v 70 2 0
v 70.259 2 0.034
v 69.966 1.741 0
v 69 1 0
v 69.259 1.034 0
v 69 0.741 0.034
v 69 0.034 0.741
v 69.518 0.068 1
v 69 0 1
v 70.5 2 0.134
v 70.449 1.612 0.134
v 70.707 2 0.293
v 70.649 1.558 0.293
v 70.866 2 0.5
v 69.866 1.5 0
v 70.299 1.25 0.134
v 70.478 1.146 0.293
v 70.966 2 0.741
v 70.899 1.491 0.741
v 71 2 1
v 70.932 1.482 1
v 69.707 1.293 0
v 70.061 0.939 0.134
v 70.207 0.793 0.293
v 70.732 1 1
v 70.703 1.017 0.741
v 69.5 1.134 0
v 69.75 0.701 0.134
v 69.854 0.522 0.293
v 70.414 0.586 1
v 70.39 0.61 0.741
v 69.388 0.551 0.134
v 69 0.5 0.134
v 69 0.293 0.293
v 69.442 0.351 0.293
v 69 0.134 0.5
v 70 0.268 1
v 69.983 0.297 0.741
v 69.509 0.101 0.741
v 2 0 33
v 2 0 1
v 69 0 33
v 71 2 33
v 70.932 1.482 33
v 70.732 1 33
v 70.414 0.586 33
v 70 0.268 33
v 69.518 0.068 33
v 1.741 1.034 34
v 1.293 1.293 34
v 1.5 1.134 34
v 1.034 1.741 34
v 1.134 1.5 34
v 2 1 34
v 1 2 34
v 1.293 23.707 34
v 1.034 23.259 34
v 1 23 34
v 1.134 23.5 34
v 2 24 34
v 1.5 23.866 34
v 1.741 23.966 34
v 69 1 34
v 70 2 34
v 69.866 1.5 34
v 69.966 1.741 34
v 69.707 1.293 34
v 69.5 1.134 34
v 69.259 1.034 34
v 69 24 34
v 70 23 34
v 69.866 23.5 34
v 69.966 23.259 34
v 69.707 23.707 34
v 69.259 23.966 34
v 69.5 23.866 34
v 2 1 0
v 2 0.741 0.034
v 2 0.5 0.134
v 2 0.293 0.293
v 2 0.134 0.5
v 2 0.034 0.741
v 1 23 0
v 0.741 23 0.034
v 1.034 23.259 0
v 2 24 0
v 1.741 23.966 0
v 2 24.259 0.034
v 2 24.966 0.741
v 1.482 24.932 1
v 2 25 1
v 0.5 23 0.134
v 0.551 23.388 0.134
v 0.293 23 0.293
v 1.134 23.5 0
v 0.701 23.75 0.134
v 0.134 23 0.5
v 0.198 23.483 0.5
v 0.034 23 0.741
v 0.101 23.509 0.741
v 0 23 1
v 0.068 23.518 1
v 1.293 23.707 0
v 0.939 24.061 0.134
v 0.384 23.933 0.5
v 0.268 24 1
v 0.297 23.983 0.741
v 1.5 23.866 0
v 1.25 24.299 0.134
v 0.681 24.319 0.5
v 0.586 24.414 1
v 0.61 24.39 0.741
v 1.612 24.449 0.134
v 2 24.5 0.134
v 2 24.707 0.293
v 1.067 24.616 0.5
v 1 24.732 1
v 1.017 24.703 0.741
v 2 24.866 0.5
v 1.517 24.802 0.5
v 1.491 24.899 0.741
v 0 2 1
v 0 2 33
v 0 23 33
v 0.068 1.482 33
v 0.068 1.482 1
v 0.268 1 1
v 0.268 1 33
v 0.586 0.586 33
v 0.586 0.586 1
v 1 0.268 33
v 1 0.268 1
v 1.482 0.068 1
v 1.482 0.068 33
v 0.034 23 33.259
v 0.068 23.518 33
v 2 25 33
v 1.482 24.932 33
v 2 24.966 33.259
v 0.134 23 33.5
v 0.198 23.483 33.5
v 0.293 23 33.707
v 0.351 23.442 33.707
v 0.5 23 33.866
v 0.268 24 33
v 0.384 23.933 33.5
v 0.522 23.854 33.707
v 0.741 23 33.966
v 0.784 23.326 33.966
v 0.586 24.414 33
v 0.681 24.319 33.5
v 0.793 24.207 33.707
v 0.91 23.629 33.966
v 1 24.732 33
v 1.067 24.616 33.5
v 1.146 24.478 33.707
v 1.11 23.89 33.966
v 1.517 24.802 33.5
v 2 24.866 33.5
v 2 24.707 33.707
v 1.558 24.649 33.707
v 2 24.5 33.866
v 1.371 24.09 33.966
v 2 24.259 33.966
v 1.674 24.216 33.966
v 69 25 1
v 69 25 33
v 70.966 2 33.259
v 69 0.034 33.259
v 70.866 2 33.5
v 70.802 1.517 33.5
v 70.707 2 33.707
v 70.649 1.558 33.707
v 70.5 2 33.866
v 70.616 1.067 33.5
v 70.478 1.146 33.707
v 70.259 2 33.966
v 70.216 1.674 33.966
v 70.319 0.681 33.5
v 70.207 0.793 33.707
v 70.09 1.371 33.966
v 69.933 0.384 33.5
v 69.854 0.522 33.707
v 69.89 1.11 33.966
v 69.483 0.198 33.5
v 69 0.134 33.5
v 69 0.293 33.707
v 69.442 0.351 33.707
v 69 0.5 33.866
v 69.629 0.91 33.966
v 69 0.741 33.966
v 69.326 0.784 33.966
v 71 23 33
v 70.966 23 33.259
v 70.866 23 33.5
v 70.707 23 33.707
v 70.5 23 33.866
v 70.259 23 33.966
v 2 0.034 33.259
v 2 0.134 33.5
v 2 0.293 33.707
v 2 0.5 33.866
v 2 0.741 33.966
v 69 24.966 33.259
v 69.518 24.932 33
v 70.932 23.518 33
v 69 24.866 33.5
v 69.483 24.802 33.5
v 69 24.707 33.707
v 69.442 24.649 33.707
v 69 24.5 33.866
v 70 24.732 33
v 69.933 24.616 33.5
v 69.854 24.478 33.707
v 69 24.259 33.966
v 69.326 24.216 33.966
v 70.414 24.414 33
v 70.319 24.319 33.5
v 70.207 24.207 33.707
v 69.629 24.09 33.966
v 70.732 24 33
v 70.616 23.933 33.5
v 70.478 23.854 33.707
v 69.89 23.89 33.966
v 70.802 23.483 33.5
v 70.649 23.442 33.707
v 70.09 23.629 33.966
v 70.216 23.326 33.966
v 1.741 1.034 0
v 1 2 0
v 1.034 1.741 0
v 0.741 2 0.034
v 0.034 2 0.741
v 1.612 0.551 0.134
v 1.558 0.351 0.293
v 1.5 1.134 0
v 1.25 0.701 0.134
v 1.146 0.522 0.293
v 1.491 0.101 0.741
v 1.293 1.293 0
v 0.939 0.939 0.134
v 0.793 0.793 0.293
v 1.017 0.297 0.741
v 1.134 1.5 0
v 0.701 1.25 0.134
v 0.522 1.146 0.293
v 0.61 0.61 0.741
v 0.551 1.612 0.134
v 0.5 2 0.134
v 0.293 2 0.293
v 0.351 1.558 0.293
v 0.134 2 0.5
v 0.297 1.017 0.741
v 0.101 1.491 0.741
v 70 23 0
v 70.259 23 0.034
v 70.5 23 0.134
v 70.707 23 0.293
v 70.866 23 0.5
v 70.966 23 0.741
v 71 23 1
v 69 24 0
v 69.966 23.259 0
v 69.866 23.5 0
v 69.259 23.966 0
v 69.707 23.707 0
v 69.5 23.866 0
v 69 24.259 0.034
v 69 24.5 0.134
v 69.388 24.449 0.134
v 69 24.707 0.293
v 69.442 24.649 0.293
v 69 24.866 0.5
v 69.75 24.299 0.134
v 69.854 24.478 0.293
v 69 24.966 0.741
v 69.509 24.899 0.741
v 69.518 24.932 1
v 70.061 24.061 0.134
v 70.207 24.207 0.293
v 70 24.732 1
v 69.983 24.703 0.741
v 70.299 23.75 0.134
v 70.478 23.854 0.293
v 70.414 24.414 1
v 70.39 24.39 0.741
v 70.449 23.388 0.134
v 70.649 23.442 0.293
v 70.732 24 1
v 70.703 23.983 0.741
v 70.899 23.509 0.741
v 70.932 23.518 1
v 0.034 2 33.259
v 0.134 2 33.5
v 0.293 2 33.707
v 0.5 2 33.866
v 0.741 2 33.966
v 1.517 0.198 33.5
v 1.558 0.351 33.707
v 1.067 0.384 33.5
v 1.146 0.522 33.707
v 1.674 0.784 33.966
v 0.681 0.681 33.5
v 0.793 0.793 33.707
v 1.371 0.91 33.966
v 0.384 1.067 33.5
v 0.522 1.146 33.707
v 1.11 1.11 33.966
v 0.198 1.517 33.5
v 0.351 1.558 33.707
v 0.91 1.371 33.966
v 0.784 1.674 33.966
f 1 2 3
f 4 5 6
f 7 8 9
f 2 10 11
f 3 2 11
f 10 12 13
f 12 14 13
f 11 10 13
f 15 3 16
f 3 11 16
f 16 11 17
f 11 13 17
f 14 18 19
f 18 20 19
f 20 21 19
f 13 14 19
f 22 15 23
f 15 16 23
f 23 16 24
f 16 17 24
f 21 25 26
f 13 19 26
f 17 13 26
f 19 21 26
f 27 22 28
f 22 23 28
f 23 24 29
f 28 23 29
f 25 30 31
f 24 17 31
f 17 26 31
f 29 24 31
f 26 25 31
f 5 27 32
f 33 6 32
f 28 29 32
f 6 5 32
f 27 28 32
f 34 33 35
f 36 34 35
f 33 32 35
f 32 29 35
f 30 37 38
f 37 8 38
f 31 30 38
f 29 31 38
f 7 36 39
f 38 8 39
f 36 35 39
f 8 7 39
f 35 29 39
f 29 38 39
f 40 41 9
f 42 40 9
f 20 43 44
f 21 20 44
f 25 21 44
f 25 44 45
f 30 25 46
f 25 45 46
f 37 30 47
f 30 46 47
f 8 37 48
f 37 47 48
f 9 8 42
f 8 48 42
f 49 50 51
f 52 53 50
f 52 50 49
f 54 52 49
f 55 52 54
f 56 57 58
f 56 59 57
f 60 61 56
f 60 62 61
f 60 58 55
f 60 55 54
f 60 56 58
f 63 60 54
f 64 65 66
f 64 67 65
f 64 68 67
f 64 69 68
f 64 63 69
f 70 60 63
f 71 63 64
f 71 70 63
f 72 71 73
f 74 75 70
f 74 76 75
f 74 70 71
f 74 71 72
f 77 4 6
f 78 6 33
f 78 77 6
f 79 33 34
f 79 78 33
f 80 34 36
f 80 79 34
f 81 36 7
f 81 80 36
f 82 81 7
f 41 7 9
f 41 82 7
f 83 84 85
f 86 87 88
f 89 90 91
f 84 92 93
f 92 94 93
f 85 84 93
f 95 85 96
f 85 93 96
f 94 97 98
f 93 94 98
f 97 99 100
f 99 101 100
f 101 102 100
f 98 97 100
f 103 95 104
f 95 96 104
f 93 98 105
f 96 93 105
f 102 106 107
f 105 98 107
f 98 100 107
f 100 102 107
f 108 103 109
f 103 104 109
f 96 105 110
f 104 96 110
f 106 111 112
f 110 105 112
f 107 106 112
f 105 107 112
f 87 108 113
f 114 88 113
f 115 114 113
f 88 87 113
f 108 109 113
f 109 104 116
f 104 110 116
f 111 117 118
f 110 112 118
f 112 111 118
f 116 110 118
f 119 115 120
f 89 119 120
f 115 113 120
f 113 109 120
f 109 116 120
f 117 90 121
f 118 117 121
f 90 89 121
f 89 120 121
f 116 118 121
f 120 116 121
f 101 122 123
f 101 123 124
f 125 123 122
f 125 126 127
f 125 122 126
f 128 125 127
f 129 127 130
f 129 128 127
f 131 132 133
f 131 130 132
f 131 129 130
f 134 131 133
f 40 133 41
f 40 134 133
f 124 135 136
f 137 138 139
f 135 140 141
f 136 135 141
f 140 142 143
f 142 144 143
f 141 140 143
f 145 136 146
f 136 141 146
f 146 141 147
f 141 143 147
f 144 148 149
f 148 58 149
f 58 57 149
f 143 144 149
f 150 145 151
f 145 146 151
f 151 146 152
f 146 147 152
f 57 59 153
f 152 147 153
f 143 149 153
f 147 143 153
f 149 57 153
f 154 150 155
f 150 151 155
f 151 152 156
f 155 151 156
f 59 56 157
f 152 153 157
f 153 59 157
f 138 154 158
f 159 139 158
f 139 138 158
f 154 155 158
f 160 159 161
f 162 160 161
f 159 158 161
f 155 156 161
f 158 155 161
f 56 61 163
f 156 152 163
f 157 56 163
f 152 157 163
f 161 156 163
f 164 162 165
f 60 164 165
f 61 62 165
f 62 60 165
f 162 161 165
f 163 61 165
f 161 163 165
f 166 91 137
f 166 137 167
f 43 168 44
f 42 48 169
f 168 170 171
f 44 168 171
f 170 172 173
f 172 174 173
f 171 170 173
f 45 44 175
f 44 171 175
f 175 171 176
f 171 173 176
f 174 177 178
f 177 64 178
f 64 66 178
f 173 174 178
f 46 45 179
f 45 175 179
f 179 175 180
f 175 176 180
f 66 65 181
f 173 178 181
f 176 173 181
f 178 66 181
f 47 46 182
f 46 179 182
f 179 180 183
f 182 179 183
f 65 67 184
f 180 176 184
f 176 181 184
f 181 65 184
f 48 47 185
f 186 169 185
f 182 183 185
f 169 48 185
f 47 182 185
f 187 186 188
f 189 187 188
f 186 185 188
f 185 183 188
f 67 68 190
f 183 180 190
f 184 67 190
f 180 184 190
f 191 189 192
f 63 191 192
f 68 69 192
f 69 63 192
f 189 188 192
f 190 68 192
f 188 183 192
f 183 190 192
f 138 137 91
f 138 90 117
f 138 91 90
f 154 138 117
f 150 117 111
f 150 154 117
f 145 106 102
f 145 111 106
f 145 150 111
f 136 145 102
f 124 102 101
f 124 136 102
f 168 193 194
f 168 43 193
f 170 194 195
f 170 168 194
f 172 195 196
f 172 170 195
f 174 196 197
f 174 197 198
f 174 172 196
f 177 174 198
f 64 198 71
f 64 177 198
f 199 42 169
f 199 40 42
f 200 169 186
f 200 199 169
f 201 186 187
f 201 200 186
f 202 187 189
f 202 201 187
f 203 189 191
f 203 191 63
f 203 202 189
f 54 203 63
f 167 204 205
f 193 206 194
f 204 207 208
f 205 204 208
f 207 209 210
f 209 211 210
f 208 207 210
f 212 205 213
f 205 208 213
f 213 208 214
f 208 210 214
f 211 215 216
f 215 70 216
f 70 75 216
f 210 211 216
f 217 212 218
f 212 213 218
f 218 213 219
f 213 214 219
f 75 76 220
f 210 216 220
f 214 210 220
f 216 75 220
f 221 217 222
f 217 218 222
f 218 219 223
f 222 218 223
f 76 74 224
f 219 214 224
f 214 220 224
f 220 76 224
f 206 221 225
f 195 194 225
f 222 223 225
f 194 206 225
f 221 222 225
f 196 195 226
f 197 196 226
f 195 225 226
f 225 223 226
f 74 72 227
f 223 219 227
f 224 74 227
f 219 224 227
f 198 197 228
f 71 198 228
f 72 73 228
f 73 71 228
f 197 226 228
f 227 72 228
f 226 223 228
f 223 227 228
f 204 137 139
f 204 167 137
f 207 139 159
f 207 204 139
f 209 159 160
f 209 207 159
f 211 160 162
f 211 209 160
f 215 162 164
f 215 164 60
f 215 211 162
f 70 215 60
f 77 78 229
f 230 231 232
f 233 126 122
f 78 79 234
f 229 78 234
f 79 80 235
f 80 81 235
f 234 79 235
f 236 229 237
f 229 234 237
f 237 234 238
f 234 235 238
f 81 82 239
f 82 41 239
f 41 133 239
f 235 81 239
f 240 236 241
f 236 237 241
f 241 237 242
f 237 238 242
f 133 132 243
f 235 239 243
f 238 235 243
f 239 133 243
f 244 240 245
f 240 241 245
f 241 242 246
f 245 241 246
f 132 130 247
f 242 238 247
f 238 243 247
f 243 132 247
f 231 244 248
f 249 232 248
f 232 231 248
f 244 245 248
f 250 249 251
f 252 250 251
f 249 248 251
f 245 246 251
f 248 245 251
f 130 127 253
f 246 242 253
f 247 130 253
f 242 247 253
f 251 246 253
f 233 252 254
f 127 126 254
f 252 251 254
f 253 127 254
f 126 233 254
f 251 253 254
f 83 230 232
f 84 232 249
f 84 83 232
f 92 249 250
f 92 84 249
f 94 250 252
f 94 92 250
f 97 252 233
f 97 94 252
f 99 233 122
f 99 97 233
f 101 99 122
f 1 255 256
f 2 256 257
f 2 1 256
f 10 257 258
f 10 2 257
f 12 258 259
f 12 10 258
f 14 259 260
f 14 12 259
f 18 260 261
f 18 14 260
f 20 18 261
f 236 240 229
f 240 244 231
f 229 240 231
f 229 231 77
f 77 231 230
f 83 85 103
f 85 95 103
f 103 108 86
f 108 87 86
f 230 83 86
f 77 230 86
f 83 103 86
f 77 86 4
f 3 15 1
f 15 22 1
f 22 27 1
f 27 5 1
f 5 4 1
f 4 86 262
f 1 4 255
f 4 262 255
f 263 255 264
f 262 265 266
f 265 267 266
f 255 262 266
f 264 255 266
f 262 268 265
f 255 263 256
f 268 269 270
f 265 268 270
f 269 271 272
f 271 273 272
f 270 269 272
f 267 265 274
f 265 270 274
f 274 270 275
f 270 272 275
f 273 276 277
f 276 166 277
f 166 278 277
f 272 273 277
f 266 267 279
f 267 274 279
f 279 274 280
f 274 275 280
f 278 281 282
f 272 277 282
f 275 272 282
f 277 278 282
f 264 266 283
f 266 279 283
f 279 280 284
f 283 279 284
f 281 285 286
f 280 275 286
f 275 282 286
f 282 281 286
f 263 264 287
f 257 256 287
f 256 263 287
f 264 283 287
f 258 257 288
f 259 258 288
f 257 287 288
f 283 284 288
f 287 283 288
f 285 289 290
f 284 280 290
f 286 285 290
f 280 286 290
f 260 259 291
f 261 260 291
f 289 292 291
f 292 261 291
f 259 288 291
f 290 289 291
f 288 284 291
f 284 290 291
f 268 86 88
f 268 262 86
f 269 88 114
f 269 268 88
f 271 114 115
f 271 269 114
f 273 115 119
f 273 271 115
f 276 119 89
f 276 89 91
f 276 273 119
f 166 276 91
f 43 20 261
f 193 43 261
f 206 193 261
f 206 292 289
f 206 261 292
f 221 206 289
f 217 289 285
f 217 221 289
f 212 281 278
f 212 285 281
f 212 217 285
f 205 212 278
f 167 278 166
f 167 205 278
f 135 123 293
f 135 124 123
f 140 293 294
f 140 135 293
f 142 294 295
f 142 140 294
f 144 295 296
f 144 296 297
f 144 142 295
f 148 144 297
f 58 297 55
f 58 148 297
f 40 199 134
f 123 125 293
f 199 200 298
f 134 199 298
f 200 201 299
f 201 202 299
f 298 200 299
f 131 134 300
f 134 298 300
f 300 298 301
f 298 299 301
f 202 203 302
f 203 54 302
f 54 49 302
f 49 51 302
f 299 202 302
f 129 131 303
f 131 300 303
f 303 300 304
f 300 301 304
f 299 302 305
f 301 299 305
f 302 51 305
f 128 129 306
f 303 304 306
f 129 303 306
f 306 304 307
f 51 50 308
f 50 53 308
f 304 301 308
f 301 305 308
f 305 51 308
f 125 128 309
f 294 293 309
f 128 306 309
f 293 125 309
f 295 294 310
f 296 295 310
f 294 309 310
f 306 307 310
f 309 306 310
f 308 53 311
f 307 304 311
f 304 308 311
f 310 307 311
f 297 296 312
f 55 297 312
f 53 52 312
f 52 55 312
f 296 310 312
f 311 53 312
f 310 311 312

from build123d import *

# Parameters (mm, degrees)
SKIZZE1_W                       = 71
SKIZZE1_H                       = 25
AUFSATZ_LINEAR_AUSTRAGEN1_DEPTH = 34
VERRUNDUNG2_R                   = 2
VERRUNDUNG3_R                   = 2
VERRUNDUNG4_R                   = 2
VERRUNDUNG5_R                   = 2
VERRUNDUNG6_R                   = 1
VERRUNDUNG7_R                   = 1


with BuildPart() as part:
    # Skizze1 → Aufsatz-Linear austragen1 (new body)
    with BuildSketch(Plane.XY):
        with Locations((35.5, 12.5)):
            Rectangle(SKIZZE1_W, SKIZZE1_H)
    extrude(amount=AUFSATZ_LINEAR_AUSTRAGEN1_DEPTH)

    # Verrundung2
    verrundung2_edges = [part.edges().sort_by_distance(p)[0] for p in [
        (71, 25, 17),
    ]]
    fillet(verrundung2_edges, radius=VERRUNDUNG2_R)

    # Verrundung3
    verrundung3_edges = [part.edges().sort_by_distance(p)[0] for p in [
        (71, 0, 17),
    ]]
    fillet(verrundung3_edges, radius=VERRUNDUNG3_R)

    # Verrundung4
    verrundung4_edges = [part.edges().sort_by_distance(p)[0] for p in [
        (0, 25, 17),
    ]]
    fillet(verrundung4_edges, radius=VERRUNDUNG4_R)

    # Verrundung5
    verrundung5_edges = [part.edges().sort_by_distance(p)[0] for p in [
        (0, 0, 17),
    ]]
    fillet(verrundung5_edges, radius=VERRUNDUNG5_R)

    # Verrundung6
    verrundung6_edges = [part.edges().sort_by_distance(p)[0] for p in [
        (35.5, 25, 34),
        (70.414213562, 24.414213562, 34),
        (71, 12.5, 34),
        (70.414213562, 0.585786438, 34),
        (0, 12.5, 34),
        (0.585786438, 24.414213562, 34),
        (35.5, 0, 34),
        (0.585786438, 0.585786438, 34),
    ]]
    fillet(verrundung6_edges, radius=VERRUNDUNG6_R)

    # Verrundung7
    verrundung7_edges = [part.edges().sort_by_distance(p)[0] for p in [
        (35.5, 25, 0),
        (70.414213562, 24.414213562, 0),
        (71, 12.5, 0),
        (70.414213562, 0.585786438, 0),
        (0, 12.5, 0),
        (0.585786438, 24.414213562, 0),
        (35.5, 0, 0),
        (0.585786438, 0.585786438, 0),
    ]]
    fillet(verrundung7_edges, radius=VERRUNDUNG7_R)


solid = part.part
